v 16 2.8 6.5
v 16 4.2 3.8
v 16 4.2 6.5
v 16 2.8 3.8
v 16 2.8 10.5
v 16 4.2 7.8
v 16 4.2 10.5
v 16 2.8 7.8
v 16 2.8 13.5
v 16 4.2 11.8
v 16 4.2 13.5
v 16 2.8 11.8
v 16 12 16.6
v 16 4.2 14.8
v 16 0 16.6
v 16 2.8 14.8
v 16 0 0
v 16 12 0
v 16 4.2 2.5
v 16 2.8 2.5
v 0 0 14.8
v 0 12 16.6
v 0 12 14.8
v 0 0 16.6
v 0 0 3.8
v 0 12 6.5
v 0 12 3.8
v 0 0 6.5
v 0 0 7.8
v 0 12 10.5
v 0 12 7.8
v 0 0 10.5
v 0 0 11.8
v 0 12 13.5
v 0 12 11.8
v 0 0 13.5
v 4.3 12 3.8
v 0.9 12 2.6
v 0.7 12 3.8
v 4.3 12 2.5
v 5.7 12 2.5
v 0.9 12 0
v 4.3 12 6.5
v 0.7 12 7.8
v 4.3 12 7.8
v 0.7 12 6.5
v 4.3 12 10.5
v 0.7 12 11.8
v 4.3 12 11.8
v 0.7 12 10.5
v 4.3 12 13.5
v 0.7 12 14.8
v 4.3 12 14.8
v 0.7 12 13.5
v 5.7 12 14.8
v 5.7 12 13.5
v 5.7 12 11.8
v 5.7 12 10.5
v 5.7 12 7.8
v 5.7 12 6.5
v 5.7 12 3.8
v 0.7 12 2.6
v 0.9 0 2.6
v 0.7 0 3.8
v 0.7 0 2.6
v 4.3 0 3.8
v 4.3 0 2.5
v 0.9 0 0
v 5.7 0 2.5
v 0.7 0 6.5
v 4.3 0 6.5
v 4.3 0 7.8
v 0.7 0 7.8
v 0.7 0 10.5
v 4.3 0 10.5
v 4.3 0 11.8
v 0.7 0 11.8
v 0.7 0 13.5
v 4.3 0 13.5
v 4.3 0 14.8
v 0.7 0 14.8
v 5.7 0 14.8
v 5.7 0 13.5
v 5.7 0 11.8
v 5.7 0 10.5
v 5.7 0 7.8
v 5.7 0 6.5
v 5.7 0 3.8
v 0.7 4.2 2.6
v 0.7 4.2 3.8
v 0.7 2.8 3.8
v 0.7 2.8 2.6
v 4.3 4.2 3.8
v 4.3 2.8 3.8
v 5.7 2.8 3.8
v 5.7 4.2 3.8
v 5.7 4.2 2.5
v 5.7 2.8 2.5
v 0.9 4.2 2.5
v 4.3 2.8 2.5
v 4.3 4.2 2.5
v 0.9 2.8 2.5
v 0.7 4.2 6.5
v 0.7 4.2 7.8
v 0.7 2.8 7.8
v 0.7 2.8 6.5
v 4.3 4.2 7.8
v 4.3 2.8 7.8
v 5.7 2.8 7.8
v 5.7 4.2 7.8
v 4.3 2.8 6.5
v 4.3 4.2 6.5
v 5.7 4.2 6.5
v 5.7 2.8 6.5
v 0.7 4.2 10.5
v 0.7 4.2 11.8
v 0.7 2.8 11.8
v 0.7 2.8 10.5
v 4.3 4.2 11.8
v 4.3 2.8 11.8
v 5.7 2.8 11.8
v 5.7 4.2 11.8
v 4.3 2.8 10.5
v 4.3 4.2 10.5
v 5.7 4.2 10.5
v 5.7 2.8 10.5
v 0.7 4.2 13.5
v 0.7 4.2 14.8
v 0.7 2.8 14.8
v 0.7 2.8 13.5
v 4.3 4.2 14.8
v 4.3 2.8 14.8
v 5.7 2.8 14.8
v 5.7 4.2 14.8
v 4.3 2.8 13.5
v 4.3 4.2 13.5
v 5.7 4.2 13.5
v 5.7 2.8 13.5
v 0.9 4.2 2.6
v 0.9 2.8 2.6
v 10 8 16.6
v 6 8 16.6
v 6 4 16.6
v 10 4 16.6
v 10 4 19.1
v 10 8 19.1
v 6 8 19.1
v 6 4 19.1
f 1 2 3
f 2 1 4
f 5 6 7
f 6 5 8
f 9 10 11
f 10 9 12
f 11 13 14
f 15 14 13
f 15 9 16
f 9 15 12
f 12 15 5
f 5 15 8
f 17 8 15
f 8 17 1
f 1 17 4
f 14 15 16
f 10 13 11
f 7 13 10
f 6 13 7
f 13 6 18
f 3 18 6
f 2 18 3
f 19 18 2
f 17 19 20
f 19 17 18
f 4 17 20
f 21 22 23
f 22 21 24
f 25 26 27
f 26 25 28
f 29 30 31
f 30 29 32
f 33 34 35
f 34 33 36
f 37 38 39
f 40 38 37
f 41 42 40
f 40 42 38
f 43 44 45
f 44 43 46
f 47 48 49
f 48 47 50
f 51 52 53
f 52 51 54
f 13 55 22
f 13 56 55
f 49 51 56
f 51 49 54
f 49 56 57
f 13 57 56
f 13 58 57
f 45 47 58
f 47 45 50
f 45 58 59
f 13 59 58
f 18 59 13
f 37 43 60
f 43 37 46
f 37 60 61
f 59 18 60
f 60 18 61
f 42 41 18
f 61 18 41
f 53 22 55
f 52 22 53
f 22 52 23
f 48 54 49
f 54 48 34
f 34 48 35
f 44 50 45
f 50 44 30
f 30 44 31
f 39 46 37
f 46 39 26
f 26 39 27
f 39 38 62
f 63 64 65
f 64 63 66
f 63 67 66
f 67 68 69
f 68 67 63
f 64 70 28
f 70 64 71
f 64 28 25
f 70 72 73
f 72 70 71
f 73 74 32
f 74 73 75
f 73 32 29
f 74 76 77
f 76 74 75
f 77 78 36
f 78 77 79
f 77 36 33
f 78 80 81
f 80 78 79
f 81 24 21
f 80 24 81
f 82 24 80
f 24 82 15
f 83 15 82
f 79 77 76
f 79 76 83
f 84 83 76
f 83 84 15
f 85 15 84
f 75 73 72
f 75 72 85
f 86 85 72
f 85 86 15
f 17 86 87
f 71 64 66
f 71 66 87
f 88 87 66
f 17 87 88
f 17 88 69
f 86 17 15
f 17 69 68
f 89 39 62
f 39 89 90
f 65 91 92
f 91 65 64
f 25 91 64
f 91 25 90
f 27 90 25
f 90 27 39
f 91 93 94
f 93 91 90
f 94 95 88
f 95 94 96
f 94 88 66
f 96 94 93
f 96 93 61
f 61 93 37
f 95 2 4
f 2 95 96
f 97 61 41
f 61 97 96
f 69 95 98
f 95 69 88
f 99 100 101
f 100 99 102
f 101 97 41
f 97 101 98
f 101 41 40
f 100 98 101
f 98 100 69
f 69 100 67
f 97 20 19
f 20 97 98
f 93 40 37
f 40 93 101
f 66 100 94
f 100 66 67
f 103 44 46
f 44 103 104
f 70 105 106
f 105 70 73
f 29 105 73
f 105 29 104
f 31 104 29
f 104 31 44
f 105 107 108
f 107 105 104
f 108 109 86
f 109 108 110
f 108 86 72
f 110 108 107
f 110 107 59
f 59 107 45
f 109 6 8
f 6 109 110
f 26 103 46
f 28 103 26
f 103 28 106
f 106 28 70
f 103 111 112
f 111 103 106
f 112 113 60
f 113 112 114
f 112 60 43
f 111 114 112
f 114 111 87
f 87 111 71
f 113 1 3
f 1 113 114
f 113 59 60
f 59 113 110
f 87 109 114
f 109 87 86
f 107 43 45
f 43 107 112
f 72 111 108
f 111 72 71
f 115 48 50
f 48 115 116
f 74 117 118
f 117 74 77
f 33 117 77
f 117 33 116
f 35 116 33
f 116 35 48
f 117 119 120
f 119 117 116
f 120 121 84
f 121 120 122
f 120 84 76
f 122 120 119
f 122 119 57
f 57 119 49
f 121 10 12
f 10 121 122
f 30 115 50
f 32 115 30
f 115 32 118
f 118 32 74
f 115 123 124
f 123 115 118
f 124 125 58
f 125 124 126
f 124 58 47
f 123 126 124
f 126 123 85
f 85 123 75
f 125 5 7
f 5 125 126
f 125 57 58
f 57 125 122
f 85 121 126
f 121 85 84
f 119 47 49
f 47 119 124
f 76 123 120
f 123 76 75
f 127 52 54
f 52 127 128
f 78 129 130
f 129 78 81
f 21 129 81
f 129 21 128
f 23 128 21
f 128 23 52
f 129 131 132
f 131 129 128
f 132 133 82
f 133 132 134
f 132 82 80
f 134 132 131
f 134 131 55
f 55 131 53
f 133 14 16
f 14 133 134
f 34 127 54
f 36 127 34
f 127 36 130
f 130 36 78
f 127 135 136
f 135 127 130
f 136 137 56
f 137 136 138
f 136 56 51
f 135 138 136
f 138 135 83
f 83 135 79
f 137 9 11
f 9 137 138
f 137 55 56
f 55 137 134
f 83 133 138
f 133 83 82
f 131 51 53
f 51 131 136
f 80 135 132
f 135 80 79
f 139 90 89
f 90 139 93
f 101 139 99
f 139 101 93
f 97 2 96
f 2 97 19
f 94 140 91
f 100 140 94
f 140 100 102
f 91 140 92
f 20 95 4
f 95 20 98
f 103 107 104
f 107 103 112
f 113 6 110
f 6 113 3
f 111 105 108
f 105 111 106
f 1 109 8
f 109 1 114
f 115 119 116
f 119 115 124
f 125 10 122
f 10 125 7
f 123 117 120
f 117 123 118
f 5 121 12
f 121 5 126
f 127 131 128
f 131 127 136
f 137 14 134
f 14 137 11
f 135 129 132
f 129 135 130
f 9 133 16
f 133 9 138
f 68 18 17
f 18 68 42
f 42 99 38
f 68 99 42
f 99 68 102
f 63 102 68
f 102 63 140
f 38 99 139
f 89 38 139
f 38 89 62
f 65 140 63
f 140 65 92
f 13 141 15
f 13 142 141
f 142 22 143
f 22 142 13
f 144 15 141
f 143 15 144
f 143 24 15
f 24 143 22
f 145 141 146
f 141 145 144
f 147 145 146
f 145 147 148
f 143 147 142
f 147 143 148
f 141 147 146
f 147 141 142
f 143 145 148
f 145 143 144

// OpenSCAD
// 公寓楼 (battle_apartment) — 多层 可进入 枪战掩体
// 楼板分隔(垂直作战) + 真实大门洞(可进) + 前后/侧面窗洞(可穿窗射击) + 屋顶楼梯间
$fn = 4;

module apartment() {
  w = 16; d = 12; h = 16;

  // 楼板（分隔层，提供上下层交火）
  for (fz = [4, 8, 12])
    color([0.70, 0.70, 0.68]) translate([0, 0, fz]) cube([w, d, 0.3]);

  // 主体：开门洞 + 窗洞
  color([0.80, 0.79, 0.76])
    difference() {
      cube([w, d, h]);
      // 大门洞（前 +y，贯穿，可进入）
      translate([-0.9, -0.3, 0]) cube([1.8, d + 0.6, 2.6]);
      // 前/后 窗洞（贯穿）每层 3 个
      for (fy = [2.5, 6.5, 10.5, 13.5])
        for (fx = [-5, 0, 5])
          translate([fx - 0.7, -0.3, fy]) cube([1.4, d + 0.6, 1.3]);
      // 侧窗洞（贯穿）每层 2 个
      for (fy = [2.5, 6.5, 10.5, 13.5])
        for (fy2 = [-3.5, 3.5])
          translate([-0.3, fy2 - 0.7, fy]) cube([w + 0.6, 1.4, 1.3]);
    }

  // 屋顶女儿墙
  color([0.66, 0.66, 0.64]) translate([0, 0, h]) cube([w, d, 0.6]);
  // 屋顶楼梯间（提供上屋顶的掩体）
  color([0.60, 0.60, 0.58]) translate([w/2 - 2, d/2 - 2, h + 0.6]) cube([4, 4, 2.5]);
}

apartment();
